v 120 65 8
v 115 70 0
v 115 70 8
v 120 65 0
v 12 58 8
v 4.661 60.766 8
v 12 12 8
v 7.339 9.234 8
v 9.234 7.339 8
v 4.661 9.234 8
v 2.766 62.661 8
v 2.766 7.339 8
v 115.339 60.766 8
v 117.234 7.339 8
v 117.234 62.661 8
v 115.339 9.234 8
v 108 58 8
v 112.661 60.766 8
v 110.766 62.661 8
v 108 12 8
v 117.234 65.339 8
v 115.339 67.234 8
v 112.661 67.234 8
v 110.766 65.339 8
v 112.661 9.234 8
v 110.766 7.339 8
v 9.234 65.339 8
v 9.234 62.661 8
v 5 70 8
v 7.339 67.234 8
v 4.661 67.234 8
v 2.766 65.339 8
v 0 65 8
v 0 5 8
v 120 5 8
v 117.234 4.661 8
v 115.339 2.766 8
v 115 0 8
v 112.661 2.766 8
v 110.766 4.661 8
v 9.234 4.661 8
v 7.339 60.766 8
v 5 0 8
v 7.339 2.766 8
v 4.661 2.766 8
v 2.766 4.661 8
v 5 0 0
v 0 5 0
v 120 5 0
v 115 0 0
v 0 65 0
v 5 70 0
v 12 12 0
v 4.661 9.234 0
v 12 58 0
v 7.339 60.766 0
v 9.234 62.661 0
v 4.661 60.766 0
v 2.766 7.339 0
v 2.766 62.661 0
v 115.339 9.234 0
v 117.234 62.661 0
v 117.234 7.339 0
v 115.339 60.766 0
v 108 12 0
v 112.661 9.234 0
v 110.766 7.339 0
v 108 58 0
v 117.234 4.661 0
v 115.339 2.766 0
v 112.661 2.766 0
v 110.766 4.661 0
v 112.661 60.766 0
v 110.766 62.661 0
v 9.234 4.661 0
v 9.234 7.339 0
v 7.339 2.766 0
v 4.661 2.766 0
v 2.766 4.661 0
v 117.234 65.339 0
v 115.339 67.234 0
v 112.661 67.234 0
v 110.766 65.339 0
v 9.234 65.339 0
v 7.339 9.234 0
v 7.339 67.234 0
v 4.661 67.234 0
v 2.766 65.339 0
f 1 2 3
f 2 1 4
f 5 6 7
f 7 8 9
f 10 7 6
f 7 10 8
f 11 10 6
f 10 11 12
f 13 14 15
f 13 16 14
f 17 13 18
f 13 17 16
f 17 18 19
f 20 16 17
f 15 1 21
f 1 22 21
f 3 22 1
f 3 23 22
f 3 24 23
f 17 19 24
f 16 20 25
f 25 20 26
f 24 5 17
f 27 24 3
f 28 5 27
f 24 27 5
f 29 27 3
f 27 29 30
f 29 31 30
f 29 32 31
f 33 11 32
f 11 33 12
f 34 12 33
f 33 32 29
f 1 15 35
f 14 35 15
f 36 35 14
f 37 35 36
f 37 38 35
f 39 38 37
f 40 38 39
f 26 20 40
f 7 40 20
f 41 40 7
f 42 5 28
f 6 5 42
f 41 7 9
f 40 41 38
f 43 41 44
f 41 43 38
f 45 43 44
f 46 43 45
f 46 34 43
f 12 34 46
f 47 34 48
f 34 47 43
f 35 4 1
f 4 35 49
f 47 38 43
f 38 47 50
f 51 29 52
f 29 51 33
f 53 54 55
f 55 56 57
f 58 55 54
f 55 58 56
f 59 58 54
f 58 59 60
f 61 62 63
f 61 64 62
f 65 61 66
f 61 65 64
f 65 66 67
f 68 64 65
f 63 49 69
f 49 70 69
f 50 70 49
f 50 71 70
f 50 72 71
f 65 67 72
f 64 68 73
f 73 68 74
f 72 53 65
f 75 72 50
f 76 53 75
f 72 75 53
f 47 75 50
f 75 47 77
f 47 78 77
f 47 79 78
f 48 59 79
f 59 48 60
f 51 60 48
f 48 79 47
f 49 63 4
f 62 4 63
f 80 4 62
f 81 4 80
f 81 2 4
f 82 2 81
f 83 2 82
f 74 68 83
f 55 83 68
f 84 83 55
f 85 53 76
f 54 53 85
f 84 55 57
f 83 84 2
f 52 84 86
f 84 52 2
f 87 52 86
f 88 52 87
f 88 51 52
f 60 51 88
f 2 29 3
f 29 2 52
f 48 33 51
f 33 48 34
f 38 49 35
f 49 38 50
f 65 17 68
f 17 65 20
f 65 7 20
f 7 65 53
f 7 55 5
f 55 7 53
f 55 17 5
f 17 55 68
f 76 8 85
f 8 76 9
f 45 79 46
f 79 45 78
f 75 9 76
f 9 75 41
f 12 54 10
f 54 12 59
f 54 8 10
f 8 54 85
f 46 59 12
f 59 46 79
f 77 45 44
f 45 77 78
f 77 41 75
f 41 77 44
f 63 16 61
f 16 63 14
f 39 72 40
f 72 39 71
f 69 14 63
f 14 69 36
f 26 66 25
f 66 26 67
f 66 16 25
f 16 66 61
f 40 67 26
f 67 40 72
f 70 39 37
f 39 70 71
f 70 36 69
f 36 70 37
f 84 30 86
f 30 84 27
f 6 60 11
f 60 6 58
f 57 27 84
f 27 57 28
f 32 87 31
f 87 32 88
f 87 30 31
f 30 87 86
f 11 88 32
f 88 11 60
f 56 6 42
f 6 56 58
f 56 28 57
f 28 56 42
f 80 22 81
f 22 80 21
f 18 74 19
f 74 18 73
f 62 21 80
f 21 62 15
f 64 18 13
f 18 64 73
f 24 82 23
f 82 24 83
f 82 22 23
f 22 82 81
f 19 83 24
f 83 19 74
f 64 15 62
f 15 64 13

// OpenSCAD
$fn = 32;

// ----------------------------------------------------------------------
// Frame plate: 120 x 70 frame, 12 mm rails
// ----------------------------------------------------------------------

// --- parameters (mm) ---
plate_l = 120;            // plate length, X
plate_w = 70;             // plate width, Y
plate_t = 8;              // plate thickness, Z (extrusion height)
corner_c = 5;             // corner chamfer
frame_bar = 12;           // frame rail width
bolt_r = 3.5;             // corner bolt window radius
bolt_inset = 6;           // bolt centre inset from the edges

win_l = plate_l - 2 * frame_bar;  // window length
win_w = plate_w - 2 * frame_bar;  // window width
bolt_d = 2 * bolt_r;  // corner hole diameter

profile = [[5, 0], [115, 0], [120, 5], [120, 65], [115, 70], [5, 70], [0, 65], [0, 5]];  // primary outline, 8 points, counter clockwise
void_1 = [[12, 12], [108, 12], [108, 58], [12, 58]];  // the window, 4 points
void_2 = [[9.234, 7.339], [7.339, 9.234], [4.661, 9.234], [2.766, 7.339], [2.766, 4.661], [4.661, 2.766], [7.339, 2.766], [9.234, 4.661]];  // corner bolt window, 8 points
void_3 = [[117.234, 7.339], [115.339, 9.234], [112.661, 9.234], [110.766, 7.339], [110.766, 4.661], [112.661, 2.766], [115.339, 2.766], [117.234, 4.661]];  // corner bolt window, 8 points
void_4 = [[9.234, 65.339], [7.339, 67.234], [4.661, 67.234], [2.766, 65.339], [2.766, 62.661], [4.661, 60.766], [7.339, 60.766], [9.234, 62.661]];  // corner bolt window, 8 points
void_5 = [[117.234, 65.339], [115.339, 67.234], [112.661, 67.234], [110.766, 65.339], [110.766, 62.661], [112.661, 60.766], [115.339, 60.766], [117.234, 62.661]];  // corner bolt window, 8 points

// --- the one profile operation ---
difference() {
  linear_extrude(height = plate_t) polygon(points = profile);
  translate([0, 0, -1])
    linear_extrude(height = plate_t + 2) polygon(points = void_1);
  translate([0, 0, -1])
    linear_extrude(height = plate_t + 2) polygon(points = void_2);
  translate([0, 0, -1])
    linear_extrude(height = plate_t + 2) polygon(points = void_3);
  translate([0, 0, -1])
    linear_extrude(height = plate_t + 2) polygon(points = void_4);
  translate([0, 0, -1])
    linear_extrude(height = plate_t + 2) polygon(points = void_5);
}
